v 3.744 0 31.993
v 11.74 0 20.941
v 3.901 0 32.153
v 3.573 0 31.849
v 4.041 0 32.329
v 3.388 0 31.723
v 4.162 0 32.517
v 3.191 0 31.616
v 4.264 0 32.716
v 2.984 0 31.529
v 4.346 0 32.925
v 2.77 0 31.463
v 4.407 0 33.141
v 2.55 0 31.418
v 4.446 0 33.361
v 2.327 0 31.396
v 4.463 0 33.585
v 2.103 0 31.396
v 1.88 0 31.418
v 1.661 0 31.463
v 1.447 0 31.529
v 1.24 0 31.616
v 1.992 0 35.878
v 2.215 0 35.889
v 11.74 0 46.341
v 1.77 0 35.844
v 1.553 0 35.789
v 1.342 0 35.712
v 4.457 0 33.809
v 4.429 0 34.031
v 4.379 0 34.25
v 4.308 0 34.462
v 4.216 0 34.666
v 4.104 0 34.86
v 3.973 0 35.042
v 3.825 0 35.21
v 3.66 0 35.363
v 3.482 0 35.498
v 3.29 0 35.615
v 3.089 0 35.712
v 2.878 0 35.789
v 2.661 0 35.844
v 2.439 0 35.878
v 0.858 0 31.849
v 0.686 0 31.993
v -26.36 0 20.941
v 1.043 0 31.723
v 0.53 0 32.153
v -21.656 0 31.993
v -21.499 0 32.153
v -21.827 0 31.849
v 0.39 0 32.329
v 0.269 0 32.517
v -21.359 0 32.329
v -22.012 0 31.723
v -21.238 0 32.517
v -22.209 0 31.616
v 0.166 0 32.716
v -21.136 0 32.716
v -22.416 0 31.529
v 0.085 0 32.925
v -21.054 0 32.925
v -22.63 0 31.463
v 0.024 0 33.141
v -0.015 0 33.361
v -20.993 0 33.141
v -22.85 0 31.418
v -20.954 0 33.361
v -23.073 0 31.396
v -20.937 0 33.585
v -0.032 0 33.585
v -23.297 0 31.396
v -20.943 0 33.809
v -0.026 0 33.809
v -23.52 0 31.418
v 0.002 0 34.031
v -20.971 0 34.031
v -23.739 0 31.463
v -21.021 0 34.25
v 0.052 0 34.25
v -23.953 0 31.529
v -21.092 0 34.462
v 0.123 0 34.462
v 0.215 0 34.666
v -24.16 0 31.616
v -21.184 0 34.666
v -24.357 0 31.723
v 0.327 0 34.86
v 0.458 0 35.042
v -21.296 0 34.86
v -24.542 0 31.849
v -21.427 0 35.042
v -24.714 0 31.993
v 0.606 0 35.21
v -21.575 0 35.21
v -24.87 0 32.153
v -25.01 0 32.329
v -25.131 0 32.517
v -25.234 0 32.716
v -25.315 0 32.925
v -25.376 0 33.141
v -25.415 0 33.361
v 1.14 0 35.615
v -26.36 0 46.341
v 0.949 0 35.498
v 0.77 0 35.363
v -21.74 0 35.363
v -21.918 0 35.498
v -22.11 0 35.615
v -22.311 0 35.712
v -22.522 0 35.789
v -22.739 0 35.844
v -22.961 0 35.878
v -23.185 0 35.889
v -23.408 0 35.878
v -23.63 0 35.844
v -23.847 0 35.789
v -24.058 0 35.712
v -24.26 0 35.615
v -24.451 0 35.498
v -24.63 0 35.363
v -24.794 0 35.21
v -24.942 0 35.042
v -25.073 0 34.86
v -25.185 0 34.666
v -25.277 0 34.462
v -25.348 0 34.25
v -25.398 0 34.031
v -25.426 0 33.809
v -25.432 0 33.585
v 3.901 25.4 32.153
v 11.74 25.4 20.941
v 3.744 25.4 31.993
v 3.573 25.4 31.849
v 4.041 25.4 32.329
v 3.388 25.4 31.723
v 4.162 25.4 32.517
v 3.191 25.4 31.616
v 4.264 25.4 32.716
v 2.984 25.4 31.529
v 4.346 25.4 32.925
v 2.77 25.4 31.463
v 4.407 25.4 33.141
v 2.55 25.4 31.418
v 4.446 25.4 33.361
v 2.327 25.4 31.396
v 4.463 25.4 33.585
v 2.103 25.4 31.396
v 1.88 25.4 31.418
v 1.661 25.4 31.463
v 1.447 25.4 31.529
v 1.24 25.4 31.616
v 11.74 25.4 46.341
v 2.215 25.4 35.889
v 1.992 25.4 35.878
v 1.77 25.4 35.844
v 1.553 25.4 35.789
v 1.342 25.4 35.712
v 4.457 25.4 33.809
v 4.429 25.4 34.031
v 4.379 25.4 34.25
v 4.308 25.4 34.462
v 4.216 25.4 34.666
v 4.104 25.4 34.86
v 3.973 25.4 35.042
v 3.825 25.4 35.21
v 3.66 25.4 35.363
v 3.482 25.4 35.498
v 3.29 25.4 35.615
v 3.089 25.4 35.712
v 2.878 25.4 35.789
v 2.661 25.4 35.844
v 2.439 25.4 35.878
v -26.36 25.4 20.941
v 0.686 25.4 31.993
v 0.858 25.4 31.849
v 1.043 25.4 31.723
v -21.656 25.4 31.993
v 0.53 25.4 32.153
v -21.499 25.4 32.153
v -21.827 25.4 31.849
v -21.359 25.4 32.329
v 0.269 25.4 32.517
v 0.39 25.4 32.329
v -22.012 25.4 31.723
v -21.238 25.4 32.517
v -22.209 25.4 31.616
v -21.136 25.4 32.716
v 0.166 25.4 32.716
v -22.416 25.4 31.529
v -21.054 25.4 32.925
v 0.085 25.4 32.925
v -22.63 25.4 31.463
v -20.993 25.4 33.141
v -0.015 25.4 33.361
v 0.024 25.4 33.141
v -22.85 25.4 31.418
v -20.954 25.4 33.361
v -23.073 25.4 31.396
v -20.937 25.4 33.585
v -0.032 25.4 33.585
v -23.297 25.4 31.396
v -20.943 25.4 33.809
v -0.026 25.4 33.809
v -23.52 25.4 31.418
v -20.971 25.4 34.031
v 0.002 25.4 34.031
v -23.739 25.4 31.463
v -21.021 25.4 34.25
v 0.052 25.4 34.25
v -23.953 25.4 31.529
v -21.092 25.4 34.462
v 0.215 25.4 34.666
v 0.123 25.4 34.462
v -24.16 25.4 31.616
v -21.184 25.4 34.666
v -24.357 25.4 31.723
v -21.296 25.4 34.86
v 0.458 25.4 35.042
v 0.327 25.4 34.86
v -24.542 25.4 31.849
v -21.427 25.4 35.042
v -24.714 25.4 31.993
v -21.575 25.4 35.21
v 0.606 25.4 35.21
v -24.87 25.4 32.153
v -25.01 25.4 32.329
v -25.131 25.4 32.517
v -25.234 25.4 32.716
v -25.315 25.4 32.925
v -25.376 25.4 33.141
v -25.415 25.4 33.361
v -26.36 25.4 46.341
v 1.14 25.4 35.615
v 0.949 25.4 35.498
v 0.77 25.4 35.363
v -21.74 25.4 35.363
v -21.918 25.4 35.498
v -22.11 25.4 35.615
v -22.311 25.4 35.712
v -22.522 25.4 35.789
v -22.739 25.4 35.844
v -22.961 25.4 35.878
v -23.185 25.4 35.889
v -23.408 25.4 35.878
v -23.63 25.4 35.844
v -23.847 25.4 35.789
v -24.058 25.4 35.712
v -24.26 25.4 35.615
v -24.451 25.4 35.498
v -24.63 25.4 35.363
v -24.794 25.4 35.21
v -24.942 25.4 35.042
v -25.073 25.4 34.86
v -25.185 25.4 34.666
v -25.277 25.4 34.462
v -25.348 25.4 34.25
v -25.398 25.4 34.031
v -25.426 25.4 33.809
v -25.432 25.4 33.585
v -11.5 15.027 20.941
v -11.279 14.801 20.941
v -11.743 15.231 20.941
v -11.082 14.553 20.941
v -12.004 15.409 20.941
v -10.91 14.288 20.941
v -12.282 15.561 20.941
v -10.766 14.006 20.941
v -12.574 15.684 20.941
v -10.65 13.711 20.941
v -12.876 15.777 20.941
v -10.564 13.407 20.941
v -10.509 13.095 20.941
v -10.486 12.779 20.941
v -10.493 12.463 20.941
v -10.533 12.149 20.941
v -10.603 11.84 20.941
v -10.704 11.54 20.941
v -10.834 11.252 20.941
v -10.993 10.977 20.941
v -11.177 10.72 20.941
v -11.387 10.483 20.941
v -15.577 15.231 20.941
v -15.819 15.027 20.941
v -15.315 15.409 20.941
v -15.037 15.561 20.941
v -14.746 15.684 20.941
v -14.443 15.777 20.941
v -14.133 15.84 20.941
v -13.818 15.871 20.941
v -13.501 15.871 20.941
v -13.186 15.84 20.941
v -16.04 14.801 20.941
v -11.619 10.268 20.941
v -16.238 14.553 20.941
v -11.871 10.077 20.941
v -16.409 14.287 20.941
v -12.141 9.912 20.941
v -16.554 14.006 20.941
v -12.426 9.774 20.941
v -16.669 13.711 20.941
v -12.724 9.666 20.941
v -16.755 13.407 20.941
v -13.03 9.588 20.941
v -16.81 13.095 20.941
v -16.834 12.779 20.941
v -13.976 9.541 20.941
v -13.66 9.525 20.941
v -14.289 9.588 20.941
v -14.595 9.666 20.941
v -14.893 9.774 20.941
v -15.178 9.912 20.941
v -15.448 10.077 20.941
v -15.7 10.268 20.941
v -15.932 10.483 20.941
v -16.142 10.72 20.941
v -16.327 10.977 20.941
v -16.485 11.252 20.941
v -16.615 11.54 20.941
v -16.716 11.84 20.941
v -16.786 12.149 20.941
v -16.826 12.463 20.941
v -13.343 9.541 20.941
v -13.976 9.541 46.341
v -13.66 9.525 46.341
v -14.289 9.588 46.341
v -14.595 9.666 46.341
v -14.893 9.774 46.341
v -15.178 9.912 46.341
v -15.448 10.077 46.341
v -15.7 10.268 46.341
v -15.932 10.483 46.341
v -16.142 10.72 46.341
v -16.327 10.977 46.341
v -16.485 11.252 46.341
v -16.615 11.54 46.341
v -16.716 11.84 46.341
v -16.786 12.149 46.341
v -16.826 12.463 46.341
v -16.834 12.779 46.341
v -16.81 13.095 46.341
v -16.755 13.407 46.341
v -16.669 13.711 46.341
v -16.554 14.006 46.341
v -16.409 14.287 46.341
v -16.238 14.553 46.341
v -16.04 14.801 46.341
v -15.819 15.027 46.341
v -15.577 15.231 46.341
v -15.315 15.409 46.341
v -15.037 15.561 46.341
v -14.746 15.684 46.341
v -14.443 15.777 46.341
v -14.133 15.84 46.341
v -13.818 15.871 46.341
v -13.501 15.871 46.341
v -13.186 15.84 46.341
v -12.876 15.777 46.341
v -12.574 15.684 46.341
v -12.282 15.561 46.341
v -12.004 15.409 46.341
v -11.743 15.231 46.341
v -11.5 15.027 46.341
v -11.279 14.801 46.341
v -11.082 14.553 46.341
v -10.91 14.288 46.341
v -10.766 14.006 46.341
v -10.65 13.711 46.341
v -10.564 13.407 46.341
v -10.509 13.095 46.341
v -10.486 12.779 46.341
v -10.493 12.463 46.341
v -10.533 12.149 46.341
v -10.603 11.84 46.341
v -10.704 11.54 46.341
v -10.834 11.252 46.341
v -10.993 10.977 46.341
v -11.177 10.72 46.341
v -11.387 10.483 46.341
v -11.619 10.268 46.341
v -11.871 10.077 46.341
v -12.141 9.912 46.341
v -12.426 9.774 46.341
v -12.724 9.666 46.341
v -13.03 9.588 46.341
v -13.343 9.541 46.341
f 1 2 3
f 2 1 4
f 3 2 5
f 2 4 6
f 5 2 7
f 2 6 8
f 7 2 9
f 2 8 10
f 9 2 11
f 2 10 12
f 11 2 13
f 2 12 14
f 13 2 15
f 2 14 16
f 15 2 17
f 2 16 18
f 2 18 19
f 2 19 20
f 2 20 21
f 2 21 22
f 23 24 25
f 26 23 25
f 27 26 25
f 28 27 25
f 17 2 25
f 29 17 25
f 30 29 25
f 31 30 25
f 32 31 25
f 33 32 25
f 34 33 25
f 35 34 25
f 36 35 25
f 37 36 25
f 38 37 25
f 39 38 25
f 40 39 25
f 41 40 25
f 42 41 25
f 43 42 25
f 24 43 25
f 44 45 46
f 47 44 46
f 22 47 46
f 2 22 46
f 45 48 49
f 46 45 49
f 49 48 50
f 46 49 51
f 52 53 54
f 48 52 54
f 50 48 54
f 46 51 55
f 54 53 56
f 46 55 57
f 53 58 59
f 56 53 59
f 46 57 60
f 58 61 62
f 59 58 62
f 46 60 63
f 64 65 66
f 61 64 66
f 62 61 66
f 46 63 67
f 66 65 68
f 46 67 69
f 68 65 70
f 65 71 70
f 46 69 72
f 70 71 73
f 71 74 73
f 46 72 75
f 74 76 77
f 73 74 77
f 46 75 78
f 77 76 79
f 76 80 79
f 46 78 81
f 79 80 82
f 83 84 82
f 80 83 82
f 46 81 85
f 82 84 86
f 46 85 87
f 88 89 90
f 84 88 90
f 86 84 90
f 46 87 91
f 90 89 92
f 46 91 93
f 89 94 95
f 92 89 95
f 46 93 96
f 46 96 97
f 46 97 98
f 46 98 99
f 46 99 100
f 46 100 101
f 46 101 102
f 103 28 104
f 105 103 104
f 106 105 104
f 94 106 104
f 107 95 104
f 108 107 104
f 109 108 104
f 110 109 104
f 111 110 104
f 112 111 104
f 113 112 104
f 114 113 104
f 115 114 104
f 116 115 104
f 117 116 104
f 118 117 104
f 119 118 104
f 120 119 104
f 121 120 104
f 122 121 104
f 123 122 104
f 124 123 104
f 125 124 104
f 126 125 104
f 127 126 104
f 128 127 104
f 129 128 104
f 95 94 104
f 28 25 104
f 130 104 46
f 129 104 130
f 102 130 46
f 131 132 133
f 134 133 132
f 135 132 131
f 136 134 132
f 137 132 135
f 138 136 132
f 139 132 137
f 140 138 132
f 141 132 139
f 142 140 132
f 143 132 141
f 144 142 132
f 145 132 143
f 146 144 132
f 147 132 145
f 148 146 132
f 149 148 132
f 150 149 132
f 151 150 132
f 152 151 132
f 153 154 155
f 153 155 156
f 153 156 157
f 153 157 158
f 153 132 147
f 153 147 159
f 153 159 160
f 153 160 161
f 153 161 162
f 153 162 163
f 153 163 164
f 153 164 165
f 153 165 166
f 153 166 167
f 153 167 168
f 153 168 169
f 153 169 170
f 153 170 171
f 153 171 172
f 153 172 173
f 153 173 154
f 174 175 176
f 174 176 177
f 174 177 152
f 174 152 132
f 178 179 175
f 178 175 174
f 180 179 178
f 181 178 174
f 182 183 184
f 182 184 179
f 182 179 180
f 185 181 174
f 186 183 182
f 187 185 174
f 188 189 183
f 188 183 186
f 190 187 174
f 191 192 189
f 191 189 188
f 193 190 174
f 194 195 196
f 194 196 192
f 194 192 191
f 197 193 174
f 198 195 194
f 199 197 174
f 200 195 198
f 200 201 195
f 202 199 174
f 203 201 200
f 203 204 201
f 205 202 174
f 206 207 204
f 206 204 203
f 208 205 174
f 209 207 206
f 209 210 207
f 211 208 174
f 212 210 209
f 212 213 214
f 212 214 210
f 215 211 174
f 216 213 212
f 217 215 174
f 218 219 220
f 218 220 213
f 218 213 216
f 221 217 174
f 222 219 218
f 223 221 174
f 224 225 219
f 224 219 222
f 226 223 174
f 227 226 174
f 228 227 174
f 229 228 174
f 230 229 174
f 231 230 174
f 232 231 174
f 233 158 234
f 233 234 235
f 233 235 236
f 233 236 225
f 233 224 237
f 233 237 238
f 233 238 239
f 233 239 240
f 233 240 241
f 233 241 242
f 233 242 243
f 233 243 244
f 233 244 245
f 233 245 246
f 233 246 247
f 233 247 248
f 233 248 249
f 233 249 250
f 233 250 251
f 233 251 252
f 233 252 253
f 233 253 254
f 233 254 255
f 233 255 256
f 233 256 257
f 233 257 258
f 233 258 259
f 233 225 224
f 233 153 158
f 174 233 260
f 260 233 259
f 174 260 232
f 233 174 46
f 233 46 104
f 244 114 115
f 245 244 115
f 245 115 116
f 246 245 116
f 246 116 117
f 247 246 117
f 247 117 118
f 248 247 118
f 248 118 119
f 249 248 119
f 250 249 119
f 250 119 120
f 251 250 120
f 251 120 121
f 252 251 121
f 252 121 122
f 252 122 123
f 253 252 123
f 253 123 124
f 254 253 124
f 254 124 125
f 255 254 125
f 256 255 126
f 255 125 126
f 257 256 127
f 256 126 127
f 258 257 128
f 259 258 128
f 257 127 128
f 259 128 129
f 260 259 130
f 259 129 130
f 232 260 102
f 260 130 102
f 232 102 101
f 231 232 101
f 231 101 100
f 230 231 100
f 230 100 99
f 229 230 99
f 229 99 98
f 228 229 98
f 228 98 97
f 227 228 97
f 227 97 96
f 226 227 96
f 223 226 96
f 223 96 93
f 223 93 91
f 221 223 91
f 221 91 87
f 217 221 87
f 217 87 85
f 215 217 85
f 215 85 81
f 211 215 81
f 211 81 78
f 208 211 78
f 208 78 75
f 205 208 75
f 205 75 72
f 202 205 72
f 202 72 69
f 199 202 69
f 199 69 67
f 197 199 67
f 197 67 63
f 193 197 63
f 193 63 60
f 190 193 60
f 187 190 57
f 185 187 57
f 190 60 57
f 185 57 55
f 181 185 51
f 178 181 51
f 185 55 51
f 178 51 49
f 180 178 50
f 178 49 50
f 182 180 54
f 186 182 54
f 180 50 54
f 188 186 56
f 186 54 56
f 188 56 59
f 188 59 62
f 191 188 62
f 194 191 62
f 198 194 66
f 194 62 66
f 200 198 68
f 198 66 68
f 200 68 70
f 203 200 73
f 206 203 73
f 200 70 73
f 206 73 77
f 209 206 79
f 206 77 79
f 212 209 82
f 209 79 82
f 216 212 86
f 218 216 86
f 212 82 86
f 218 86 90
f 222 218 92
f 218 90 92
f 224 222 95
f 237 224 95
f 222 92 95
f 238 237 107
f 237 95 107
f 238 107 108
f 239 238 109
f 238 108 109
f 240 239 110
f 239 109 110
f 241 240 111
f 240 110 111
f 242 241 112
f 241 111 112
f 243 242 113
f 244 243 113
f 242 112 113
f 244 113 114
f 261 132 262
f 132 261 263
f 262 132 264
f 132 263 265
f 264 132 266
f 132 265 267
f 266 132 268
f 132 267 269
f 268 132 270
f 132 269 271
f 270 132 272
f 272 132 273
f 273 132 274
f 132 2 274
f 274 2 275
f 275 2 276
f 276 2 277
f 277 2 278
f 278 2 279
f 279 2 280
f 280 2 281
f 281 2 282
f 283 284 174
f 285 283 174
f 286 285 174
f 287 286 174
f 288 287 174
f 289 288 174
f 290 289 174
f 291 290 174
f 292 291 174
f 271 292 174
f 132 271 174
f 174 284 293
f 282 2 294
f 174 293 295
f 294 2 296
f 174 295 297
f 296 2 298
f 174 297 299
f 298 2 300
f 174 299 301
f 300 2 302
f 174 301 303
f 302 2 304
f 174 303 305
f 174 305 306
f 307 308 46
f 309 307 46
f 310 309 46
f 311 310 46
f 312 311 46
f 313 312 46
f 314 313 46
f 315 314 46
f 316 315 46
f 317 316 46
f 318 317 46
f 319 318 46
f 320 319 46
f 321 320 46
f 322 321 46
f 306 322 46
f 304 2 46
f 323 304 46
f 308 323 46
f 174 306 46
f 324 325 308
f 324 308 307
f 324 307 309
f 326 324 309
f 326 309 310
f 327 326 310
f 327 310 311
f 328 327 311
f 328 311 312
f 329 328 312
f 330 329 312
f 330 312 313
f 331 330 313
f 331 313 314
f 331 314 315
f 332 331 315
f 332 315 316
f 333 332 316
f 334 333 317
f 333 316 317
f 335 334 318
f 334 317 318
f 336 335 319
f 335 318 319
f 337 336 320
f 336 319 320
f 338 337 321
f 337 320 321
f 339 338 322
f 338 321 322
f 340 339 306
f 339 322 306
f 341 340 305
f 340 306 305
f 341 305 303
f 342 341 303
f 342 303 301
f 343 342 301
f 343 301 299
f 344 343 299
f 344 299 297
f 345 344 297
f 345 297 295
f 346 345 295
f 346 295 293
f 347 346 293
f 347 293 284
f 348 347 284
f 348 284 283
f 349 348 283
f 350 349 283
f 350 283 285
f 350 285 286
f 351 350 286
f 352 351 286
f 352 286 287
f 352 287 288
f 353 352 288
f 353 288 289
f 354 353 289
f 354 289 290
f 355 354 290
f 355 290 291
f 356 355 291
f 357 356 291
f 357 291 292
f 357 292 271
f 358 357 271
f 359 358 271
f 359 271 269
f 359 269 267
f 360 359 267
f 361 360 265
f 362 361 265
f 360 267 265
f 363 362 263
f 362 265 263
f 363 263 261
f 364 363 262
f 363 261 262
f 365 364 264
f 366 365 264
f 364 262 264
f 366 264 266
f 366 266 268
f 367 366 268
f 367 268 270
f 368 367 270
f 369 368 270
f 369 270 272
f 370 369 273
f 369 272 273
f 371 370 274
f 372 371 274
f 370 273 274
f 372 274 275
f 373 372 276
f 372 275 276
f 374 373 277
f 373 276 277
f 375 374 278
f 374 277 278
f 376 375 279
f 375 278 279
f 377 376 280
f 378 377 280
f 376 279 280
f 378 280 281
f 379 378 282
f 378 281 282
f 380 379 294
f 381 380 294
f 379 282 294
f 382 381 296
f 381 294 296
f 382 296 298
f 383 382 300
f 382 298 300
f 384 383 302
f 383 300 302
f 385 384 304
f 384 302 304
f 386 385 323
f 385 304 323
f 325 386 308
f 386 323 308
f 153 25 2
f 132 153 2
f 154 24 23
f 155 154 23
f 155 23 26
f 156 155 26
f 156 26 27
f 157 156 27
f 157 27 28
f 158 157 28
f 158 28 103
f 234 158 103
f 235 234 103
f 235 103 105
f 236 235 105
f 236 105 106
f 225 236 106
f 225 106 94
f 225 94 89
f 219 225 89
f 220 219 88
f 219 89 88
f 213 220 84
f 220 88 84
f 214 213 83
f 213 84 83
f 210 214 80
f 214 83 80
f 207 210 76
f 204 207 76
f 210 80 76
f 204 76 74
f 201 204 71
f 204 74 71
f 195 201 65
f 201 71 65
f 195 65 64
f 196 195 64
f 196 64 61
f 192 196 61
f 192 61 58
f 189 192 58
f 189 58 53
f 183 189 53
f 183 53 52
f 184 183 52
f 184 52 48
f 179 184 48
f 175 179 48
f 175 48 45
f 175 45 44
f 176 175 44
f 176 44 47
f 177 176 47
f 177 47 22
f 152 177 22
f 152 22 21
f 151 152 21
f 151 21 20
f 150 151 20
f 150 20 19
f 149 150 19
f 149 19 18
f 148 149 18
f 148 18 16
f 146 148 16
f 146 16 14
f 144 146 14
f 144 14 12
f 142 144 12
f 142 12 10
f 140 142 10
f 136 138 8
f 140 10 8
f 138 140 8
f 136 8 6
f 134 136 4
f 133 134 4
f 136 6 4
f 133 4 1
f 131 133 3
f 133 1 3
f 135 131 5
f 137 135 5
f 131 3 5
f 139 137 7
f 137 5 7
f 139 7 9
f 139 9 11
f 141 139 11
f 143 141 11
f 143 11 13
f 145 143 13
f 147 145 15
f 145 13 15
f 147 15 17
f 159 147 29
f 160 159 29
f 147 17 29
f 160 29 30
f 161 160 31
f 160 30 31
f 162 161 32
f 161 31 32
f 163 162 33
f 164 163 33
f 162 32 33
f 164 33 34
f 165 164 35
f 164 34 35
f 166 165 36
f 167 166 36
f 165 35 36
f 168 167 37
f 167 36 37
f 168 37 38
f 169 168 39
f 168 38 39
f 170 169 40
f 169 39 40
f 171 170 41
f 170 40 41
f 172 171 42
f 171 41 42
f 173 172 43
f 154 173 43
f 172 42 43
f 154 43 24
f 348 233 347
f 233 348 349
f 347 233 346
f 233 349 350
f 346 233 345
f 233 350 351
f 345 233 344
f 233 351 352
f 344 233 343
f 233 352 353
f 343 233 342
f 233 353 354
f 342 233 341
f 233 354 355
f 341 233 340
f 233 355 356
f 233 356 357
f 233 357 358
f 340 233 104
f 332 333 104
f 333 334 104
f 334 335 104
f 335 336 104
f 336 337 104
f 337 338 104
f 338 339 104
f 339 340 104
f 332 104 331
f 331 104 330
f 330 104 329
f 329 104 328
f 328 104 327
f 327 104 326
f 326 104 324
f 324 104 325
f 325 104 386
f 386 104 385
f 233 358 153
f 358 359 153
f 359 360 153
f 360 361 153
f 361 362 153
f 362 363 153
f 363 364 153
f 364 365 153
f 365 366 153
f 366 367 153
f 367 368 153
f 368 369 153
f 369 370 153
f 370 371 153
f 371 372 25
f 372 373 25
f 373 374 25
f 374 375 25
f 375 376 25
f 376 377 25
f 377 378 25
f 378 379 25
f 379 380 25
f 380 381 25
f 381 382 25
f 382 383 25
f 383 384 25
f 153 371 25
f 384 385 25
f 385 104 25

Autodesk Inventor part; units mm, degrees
ref_plane "YZ Plane" through (0, 0, 0) normal (1, 0, 0) x (0, 1, 0)
ref_plane "XZ Plane" through (0, 0, 0) normal (0, 1, 0) x (-1, 0, 0)
ref_plane "XY Plane" through (0, 0, 0) normal (0, 0, 1) x (1, 0, 0)
sketch "Sketch1" plane through (0, 0, 0) normal (0, 1, 0) x (-1, 0, 0)
  line L0 (26.3596, 46.3409) -> (-11.7404, 46.3409)
  line L1 (-11.7404, 46.3409) -> (-11.7404, 20.9409)
  line L2 (-11.7404, 20.9409) -> (26.3596, 20.9409)
  line L3 (26.3596, 20.9409) -> (26.3596, 46.3409)
  point P0 (0, 0)
  dimension "d0" = 25.4
  dimension "d1" = 38.1
extrude "Extrusion1" add sketch "Sketch1" along normal blind 25.4
sketch "Sketch2" plane through (0, 25.4, 0) normal (0, 1, 0) x (1, 0, 0)
  line L0 (-26.3596, -46.3409) -> (11.7404, -46.3409) projected
  line L1 (-26.3596, -20.9409) -> (-26.3596, -46.3409) projected
  point P0 (0, 0)
  point P1 (-23.1846, -33.6409)
  point P2 (2.2154, -33.6409)
  dimension "d4" = 0
  dimension "d5" = 12.7
  dimension "d6" = 3.175
  dimension "d7" = 25.4
hole "Hole1" at (-23.1846, 25.4, 33.6409) at (2.2154, 25.4, 33.6409) direction (0, -1, 0) diameter 4.4958 end through all clearance for "Flat Head Machine Screw (82)" size "#8" standard "Ansi Unified Screw Threads"
sketch "Sketch3" plane through (-26.3596, 0, 46.3409) normal (0, 0, 1) x (1, 0, 0)
  line L0 (0, 0) -> (0, 25.4) projected
  line L1 (0, 25.4) -> (38.1, 25.4) projected
  point P0 (26.3596, 0)
  point P1 (12.7, 12.7)
  dimension "d15" = 12.7
  dimension "d16" = 12.7
hole "Hole2" at (-13.6596, 12.7, 46.3409) direction (0, 0, -1) diameter 6.35 end through all
properties part number "ElevDriveBlock"
